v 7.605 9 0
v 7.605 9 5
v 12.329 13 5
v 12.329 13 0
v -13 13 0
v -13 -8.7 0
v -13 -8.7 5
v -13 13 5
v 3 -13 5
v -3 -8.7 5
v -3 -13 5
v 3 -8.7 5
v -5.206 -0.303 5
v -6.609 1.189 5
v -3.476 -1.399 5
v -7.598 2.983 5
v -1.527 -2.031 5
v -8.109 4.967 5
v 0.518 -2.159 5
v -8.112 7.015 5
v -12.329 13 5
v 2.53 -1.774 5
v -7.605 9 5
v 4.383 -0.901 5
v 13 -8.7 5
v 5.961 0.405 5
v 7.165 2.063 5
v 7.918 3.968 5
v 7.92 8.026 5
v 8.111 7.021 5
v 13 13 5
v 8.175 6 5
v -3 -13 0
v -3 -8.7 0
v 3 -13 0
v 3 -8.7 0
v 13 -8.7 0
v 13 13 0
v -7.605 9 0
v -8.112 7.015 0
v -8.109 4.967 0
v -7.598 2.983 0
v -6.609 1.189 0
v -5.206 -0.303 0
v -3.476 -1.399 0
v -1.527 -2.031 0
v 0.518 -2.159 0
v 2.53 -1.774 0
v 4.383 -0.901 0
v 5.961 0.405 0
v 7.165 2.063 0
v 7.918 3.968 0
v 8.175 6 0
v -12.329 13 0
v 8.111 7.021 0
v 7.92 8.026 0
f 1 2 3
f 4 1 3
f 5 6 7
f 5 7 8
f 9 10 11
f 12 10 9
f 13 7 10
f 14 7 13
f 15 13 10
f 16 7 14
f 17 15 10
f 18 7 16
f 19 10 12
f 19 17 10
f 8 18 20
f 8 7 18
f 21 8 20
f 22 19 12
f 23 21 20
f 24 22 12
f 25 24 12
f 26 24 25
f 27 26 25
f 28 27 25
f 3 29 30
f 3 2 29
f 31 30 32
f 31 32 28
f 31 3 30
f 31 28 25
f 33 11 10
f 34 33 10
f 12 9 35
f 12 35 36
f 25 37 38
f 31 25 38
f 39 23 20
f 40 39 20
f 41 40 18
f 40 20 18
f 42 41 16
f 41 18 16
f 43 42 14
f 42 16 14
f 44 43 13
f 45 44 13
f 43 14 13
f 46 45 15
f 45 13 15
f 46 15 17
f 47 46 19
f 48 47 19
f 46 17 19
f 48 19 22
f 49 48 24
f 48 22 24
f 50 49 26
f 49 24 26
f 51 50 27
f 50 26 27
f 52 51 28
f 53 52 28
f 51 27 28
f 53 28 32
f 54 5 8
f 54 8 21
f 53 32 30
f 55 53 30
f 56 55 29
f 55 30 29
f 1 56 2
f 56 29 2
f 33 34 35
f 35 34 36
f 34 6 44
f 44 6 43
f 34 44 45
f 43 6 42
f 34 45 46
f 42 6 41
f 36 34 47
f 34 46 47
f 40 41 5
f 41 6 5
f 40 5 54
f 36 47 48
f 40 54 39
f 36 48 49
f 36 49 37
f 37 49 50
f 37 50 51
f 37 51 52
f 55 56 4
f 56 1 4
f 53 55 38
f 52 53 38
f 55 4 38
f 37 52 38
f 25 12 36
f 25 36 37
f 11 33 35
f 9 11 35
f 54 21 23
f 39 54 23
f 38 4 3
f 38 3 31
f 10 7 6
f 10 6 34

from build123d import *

# Parameters (mm, degrees)
F0_W     = 26
F0_H     = 26
F1_DEPTH = 5
F3_DEPTH = 25
F4_W     = 10
F4_H     = 4.3
F5_DEPTH = 25


with BuildPart() as f1:
    # F0 (on Top) → F1 (new body)
    with BuildSketch(Plane.XY):
        Rectangle(F0_W, F0_H)
    extrude(amount=F1_DEPTH)

    # F2 (on face) → F3 (cut)
    with BuildSketch(Plane.XY.offset(5)):
        with BuildLine():
            ThreePointArc((-7.604645, 9), (-1.526868, -2.031146), (8.175, 6))
            ThreePointArc((8.175, 6), (8.031146, 7.526868), (7.604645, 9))
            ThreePointArc((7.604645, 9), (6.242686, 11.27821), (4.222632, 13))
            Line((4.222632, 13), (-4.222632, 13))
            ThreePointArc((-4.222632, 13), (-6.242686, 11.27821), (-7.604645, 9))
        make_face()
        with BuildLine():
            ThreePointArc((4.222632, 13), (6.242686, 11.27821), (7.604645, 9))
            Line((7.604645, 9), (12.328957, 13))
            Line((12.328957, 13), (4.222632, 13))
        make_face()
        with BuildLine():
            Line((-12.328957, 13), (-7.604645, 9))
            ThreePointArc((-7.604645, 9), (-6.242686, 11.27821), (-4.222632, 13))
            Line((-4.222632, 13), (-12.328957, 13))
        make_face()
        with BuildLine():
            Line((-4.222632, 13), (4.222632, 13))
            ThreePointArc((4.222632, 13), (0, 14.175), (-4.222632, 13))
        make_face()
    extrude(amount=-F3_DEPTH, mode=Mode.SUBTRACT)

    # F4 (on face) → F5 (cut)
    with BuildSketch(Plane.XY.offset(5)):
        with Locations((-8, -10.85)):
            Rectangle(F4_W, F4_H)
        with Locations((8, -10.85)):
            Rectangle(F4_W, F4_H)
    extrude(amount=-F5_DEPTH, mode=Mode.SUBTRACT)


solid = f1.part
